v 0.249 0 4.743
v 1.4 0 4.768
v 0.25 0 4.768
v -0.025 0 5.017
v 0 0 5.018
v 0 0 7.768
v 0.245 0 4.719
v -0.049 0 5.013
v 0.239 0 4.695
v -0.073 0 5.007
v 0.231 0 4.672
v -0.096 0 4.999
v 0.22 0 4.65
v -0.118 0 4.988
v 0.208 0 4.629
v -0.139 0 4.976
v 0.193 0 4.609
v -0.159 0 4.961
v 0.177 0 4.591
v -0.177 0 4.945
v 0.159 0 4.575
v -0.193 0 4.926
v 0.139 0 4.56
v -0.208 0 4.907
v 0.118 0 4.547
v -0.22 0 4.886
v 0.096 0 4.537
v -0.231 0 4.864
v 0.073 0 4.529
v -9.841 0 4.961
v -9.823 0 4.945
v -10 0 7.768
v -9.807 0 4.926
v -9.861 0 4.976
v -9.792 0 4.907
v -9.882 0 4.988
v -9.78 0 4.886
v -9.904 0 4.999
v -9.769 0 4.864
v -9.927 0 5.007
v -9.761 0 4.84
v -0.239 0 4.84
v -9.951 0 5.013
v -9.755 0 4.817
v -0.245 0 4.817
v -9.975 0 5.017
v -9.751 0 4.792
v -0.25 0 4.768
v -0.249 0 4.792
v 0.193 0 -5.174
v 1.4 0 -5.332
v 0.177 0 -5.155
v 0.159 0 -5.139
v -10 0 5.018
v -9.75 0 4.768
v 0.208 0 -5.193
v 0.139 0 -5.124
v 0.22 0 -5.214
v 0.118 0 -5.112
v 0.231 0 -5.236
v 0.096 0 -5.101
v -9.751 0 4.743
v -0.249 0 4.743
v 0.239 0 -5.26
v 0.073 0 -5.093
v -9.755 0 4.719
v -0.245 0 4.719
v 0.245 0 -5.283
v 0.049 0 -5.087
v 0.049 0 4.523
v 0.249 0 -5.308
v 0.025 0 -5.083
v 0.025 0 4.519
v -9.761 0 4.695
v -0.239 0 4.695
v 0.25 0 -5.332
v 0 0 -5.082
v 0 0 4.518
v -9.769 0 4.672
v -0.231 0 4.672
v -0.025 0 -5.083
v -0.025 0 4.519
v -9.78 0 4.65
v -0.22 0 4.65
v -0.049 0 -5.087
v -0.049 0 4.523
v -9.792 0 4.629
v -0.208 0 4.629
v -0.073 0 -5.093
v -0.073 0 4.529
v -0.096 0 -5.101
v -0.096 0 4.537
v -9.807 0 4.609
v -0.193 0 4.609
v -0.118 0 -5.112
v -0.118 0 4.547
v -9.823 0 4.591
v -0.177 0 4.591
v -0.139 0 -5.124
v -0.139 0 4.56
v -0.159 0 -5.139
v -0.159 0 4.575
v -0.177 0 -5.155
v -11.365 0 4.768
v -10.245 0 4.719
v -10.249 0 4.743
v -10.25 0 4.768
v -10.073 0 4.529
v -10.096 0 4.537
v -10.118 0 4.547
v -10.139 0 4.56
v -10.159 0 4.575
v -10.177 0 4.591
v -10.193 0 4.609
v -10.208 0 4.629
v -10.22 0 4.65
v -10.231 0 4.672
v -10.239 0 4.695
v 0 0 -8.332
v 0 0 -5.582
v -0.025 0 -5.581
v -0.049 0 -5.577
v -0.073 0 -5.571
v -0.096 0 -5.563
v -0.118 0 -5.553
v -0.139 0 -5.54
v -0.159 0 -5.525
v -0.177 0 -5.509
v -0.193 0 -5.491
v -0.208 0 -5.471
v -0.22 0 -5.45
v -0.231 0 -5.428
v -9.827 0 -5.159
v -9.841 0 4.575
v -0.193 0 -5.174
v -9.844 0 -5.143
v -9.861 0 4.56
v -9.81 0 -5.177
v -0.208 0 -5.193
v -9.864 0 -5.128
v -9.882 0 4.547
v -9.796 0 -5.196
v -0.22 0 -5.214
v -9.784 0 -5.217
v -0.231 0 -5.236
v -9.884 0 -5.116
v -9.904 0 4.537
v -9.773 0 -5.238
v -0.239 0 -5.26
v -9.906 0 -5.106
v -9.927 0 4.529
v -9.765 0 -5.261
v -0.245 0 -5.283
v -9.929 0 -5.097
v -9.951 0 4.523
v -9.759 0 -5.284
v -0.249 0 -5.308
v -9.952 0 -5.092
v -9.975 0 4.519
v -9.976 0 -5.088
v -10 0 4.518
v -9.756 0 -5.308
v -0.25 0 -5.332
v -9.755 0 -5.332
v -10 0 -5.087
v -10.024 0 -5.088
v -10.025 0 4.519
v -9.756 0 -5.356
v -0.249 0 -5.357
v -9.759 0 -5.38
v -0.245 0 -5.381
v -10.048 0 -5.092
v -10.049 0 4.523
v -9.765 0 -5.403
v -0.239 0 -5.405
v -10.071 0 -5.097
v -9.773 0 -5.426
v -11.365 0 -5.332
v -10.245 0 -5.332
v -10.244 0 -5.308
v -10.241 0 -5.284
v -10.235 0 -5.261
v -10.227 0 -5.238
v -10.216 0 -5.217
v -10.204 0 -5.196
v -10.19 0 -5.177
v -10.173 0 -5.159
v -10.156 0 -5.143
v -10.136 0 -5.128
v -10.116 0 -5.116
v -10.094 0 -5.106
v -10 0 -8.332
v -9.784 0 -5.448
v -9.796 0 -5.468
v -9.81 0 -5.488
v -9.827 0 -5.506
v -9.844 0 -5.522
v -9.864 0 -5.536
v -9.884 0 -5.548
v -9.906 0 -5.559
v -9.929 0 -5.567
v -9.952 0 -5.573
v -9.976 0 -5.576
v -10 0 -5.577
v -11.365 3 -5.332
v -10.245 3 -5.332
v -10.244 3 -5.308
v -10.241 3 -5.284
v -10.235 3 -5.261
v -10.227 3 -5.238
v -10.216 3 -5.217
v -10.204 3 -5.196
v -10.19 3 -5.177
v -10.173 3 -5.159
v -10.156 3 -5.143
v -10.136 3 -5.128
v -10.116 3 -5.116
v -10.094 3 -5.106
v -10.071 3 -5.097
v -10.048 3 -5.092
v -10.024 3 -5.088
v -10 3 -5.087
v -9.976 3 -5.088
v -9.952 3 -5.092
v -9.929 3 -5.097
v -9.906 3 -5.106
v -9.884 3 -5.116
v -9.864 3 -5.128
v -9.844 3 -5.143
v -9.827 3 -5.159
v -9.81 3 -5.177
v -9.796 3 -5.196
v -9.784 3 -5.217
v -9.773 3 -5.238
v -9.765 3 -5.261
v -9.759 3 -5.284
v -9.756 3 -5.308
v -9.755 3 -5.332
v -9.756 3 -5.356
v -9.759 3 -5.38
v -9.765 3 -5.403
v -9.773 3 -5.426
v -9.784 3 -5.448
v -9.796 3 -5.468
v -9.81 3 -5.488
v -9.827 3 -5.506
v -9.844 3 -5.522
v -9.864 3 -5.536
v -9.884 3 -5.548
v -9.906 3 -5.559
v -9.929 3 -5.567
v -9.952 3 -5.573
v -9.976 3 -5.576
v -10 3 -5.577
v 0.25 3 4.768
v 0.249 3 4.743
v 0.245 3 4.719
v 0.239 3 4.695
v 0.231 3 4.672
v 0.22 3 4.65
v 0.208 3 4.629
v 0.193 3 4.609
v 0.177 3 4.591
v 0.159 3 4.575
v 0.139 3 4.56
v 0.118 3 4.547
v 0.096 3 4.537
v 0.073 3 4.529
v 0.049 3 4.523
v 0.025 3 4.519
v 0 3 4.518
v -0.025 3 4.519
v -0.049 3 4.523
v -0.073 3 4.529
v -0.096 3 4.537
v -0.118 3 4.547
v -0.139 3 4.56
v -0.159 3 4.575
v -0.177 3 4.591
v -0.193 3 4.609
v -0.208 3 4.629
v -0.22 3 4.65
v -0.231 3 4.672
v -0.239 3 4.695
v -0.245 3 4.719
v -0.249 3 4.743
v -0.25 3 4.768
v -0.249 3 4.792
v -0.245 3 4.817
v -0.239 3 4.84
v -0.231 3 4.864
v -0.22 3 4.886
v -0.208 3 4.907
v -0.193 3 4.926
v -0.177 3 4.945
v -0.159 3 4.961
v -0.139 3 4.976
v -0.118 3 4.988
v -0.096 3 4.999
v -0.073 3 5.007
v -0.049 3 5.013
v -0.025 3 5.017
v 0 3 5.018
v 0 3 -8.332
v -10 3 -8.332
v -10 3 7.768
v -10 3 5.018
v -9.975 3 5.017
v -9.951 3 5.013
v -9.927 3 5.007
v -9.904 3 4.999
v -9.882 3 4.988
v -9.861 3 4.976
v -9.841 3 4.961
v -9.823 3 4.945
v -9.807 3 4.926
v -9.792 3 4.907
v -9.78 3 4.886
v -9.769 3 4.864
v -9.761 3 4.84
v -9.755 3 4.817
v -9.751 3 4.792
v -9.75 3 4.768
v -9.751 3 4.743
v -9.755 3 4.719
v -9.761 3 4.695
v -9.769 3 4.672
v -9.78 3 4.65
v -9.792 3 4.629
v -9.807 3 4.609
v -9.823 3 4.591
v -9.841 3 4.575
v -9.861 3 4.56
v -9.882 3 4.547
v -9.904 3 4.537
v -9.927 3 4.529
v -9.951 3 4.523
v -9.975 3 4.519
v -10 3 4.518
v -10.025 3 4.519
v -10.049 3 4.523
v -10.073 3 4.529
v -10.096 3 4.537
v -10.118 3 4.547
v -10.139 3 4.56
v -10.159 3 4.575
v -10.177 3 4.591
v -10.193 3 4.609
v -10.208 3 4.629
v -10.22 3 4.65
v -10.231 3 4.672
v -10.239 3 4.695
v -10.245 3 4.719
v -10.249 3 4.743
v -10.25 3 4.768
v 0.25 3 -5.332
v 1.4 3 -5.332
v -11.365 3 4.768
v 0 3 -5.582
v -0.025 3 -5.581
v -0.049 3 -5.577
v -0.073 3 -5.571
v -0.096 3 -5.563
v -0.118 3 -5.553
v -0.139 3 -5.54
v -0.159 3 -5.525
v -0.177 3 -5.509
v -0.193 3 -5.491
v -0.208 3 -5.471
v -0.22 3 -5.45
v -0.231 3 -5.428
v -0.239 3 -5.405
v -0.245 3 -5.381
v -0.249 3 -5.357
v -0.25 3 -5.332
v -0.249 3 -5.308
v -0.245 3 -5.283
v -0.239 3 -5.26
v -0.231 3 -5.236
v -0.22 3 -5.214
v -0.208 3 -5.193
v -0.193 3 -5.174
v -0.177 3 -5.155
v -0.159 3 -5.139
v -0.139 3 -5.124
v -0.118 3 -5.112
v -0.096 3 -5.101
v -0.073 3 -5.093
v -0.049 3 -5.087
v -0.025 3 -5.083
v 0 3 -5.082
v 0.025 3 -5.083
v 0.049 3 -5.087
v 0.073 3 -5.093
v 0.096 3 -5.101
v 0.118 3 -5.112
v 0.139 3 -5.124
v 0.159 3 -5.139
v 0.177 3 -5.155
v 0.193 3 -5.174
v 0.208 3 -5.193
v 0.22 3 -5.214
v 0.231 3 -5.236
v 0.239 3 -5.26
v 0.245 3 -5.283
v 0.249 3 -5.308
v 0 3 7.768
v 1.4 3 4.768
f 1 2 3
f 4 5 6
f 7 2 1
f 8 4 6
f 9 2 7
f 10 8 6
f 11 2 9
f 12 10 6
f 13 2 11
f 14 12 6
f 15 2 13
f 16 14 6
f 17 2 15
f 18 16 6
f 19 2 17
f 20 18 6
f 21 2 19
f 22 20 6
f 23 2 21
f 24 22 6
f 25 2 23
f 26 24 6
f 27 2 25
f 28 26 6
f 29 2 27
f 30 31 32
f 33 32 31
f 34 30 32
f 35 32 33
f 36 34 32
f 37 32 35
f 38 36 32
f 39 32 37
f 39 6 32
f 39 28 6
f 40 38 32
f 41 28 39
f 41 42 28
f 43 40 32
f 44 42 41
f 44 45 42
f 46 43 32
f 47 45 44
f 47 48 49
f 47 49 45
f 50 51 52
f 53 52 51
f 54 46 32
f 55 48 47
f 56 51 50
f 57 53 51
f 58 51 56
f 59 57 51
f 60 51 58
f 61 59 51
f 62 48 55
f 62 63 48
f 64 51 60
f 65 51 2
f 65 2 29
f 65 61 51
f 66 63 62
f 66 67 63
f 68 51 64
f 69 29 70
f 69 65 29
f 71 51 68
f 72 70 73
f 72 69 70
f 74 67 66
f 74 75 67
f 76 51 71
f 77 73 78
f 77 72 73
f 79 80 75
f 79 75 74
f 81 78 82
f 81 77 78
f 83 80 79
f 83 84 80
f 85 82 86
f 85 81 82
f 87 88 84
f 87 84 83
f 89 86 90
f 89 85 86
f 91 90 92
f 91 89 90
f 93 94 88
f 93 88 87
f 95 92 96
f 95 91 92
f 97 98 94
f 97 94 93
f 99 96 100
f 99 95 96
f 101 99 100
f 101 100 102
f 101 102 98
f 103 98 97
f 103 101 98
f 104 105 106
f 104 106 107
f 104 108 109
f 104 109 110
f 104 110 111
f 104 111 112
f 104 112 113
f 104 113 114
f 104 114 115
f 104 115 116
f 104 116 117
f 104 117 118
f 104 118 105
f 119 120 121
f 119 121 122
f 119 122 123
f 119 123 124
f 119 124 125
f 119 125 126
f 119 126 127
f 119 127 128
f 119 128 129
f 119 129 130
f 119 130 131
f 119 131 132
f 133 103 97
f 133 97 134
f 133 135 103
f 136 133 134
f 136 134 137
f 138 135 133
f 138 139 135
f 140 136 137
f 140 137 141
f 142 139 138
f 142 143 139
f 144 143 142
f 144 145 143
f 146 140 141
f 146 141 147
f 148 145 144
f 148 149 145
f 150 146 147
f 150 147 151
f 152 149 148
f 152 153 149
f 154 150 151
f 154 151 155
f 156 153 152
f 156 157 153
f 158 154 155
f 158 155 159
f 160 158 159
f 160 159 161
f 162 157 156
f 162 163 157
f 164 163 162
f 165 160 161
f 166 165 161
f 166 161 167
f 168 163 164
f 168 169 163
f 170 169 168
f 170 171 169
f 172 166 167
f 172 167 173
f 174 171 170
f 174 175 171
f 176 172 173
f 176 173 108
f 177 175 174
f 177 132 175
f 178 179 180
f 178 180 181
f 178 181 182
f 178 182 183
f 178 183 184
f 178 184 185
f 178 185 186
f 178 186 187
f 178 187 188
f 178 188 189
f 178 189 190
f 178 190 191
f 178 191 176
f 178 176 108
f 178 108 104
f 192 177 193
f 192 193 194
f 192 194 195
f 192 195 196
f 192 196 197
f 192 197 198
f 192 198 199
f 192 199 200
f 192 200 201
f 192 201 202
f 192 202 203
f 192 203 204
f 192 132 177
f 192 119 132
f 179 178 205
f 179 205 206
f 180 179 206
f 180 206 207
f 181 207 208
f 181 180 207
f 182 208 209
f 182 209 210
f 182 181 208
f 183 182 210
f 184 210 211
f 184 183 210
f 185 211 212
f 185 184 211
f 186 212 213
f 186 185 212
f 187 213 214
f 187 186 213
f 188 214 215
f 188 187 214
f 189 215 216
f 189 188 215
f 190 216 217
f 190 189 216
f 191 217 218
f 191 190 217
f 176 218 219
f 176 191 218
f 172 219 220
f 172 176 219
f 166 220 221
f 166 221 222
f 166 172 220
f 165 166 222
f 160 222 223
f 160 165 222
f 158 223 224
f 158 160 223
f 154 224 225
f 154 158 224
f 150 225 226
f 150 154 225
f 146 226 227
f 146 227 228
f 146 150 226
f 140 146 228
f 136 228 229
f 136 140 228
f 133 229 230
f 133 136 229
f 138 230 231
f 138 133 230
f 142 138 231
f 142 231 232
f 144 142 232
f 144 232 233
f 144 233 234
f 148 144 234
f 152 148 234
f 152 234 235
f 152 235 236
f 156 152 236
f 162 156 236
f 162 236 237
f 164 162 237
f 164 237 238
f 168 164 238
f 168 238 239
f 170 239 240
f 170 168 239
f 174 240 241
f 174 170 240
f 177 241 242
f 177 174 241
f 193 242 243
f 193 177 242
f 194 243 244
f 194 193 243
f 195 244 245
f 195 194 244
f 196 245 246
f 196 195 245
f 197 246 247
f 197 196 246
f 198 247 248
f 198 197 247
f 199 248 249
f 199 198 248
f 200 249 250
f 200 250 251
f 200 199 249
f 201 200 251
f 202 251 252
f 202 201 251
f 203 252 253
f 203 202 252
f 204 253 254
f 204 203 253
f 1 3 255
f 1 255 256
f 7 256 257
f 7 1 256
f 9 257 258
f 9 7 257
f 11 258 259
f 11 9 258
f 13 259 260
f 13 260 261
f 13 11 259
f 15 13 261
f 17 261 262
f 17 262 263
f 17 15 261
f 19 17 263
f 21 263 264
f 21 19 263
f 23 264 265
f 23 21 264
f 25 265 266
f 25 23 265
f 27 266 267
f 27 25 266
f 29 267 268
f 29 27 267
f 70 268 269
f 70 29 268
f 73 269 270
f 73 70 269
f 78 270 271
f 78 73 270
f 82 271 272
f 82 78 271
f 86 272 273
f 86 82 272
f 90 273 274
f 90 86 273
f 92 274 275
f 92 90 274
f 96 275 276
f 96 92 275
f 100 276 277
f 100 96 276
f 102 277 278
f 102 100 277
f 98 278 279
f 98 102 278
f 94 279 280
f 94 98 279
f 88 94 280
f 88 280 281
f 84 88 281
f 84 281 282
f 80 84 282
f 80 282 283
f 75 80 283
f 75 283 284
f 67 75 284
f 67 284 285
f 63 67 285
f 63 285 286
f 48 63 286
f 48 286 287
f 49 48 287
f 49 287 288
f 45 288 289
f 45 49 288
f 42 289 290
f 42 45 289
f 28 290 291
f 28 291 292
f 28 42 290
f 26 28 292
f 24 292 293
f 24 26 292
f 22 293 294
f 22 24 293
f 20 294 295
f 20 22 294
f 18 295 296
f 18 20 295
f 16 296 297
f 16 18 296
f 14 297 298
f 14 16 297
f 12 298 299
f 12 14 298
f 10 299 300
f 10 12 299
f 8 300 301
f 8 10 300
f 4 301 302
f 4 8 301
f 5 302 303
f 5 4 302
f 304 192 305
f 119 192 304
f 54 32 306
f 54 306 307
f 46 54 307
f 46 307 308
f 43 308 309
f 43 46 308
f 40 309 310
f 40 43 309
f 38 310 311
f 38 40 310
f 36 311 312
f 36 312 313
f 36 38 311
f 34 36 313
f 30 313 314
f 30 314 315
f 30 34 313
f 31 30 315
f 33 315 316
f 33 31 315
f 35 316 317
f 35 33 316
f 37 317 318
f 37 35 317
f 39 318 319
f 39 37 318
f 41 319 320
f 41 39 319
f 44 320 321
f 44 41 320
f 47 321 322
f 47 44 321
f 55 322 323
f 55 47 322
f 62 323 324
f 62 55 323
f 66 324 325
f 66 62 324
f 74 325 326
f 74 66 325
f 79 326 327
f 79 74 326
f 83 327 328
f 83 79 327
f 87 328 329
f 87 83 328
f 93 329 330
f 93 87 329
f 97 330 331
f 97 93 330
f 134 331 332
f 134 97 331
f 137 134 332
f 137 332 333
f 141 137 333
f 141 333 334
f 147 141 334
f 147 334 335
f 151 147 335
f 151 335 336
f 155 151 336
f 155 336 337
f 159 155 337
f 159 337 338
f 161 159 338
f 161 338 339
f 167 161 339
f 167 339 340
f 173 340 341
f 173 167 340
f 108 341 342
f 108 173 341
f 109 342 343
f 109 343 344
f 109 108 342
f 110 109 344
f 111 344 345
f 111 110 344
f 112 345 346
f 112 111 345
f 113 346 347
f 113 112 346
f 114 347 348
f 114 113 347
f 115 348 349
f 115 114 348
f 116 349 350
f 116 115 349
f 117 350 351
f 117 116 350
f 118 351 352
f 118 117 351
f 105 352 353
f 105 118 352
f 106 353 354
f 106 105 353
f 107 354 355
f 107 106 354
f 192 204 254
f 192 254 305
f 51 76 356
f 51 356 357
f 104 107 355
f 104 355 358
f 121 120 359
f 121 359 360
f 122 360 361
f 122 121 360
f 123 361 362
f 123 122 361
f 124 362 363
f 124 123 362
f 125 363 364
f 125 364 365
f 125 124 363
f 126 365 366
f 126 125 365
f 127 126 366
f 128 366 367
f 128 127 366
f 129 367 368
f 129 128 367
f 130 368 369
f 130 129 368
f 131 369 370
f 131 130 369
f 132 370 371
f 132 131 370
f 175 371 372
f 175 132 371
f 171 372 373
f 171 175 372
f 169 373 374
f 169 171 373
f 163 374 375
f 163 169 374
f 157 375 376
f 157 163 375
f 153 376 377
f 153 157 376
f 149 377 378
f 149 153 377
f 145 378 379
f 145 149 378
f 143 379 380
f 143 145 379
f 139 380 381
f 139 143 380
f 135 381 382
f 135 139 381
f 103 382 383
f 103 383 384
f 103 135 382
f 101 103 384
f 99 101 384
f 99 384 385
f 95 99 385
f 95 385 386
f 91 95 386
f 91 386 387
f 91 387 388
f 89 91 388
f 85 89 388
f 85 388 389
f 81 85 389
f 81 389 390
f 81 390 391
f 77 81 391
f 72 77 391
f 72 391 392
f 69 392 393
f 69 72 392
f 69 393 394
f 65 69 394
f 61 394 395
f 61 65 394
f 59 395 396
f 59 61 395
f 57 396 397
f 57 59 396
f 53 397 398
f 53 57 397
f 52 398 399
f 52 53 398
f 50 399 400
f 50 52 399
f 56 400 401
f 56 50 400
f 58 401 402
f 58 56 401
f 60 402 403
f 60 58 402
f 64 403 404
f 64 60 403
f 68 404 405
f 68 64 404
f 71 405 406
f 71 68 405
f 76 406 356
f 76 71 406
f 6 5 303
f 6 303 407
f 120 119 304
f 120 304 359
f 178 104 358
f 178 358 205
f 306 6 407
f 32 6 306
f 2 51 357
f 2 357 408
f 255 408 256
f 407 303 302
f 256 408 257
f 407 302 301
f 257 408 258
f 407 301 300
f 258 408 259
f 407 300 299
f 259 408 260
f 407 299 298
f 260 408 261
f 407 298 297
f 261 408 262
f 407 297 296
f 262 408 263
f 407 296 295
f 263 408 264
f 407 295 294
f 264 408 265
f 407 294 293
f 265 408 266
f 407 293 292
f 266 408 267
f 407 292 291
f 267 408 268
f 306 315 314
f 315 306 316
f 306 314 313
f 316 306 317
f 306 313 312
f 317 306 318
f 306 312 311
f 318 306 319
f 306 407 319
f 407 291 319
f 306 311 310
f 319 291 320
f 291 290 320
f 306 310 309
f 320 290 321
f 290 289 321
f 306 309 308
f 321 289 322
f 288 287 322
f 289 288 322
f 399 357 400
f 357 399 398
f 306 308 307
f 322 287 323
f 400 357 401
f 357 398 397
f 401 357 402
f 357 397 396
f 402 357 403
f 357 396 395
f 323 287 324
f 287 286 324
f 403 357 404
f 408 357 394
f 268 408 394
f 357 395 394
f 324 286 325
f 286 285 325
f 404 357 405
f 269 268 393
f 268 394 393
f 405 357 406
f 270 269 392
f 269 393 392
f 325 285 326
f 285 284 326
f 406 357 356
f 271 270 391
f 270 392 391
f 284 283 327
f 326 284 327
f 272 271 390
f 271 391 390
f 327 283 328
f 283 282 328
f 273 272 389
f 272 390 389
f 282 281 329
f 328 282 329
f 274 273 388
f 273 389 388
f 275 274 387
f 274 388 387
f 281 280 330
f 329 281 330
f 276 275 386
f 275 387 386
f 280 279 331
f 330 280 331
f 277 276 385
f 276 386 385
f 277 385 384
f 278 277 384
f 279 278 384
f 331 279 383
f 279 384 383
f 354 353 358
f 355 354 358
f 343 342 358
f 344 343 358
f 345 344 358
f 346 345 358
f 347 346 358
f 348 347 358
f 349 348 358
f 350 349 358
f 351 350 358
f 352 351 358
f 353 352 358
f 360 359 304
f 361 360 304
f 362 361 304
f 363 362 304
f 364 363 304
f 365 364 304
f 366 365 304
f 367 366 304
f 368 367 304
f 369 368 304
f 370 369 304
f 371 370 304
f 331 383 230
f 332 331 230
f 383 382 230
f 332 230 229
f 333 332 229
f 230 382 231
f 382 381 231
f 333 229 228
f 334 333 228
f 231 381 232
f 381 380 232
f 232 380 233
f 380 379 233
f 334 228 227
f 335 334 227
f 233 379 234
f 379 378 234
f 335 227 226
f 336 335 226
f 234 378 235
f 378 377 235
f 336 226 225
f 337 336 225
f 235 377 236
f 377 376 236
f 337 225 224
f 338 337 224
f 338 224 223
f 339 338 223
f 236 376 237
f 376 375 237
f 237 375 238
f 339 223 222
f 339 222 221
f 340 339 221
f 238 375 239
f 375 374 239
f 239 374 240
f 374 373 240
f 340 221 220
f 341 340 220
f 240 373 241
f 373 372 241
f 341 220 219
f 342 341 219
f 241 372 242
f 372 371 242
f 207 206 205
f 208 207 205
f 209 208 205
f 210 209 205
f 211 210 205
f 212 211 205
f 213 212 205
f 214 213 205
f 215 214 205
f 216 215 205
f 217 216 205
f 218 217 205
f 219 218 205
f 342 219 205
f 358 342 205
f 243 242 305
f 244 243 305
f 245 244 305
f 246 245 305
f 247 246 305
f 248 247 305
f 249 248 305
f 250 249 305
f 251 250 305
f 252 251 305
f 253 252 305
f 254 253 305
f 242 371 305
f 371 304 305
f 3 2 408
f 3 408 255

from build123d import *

# Parameters (mm, degrees)
BOSS_EXTRUDE1_DEPTH = 3


with BuildPart() as part:
    # Sketch1 → Boss-Extrude1 (new body)
    with BuildSketch(Plane(origin=(0, 0, 0), x_dir=(1, 0, 0), z_dir=(0, 1, 0))):
        with BuildLine():
            Line((0.25, 5.332122905), (1.4, 5.332122905))
            Line((1.4, 5.332122905), (1.4, -4.767877095))
            Line((1.4, -4.767877095), (0.25, -4.767877095))
            ThreePointArc((0.25, -4.767877095), (-0.176776695, -4.5911004), (0, -5.017877095))
            Line((0, -5.017877095), (0, -7.767877095))
            Line((0, -7.767877095), (-10, -7.767877095))
            Line((-10, -7.767877095), (-10, -5.017877095))
            ThreePointArc((-10, -5.017877095), (-9.823223305, -4.5911004), (-10.25, -4.767877095))
            Line((-10.25, -4.767877095), (-11.364691425, -4.767877095))
            Line((-11.364691425, -4.767877095), (-11.364691425, 5.332122905))
            Line((-11.364691425, 5.332122905), (-10.245259273, 5.332122905))
            ThreePointArc((-10.245259273, 5.332122905), (-9.826575505, 5.15869841), (-10, 5.577382178))
            Line((-10, 5.577382178), (-10, 8.332122905))
            Line((-10, 8.332122905), (0, 8.332122905))
            Line((0, 8.332122905), (0, 5.582122905))
            ThreePointArc((0, 5.582122905), (-0.176776695, 5.15534621), (0.25, 5.332122905))
        make_face()
    extrude(amount=BOSS_EXTRUDE1_DEPTH)


solid = part.part
